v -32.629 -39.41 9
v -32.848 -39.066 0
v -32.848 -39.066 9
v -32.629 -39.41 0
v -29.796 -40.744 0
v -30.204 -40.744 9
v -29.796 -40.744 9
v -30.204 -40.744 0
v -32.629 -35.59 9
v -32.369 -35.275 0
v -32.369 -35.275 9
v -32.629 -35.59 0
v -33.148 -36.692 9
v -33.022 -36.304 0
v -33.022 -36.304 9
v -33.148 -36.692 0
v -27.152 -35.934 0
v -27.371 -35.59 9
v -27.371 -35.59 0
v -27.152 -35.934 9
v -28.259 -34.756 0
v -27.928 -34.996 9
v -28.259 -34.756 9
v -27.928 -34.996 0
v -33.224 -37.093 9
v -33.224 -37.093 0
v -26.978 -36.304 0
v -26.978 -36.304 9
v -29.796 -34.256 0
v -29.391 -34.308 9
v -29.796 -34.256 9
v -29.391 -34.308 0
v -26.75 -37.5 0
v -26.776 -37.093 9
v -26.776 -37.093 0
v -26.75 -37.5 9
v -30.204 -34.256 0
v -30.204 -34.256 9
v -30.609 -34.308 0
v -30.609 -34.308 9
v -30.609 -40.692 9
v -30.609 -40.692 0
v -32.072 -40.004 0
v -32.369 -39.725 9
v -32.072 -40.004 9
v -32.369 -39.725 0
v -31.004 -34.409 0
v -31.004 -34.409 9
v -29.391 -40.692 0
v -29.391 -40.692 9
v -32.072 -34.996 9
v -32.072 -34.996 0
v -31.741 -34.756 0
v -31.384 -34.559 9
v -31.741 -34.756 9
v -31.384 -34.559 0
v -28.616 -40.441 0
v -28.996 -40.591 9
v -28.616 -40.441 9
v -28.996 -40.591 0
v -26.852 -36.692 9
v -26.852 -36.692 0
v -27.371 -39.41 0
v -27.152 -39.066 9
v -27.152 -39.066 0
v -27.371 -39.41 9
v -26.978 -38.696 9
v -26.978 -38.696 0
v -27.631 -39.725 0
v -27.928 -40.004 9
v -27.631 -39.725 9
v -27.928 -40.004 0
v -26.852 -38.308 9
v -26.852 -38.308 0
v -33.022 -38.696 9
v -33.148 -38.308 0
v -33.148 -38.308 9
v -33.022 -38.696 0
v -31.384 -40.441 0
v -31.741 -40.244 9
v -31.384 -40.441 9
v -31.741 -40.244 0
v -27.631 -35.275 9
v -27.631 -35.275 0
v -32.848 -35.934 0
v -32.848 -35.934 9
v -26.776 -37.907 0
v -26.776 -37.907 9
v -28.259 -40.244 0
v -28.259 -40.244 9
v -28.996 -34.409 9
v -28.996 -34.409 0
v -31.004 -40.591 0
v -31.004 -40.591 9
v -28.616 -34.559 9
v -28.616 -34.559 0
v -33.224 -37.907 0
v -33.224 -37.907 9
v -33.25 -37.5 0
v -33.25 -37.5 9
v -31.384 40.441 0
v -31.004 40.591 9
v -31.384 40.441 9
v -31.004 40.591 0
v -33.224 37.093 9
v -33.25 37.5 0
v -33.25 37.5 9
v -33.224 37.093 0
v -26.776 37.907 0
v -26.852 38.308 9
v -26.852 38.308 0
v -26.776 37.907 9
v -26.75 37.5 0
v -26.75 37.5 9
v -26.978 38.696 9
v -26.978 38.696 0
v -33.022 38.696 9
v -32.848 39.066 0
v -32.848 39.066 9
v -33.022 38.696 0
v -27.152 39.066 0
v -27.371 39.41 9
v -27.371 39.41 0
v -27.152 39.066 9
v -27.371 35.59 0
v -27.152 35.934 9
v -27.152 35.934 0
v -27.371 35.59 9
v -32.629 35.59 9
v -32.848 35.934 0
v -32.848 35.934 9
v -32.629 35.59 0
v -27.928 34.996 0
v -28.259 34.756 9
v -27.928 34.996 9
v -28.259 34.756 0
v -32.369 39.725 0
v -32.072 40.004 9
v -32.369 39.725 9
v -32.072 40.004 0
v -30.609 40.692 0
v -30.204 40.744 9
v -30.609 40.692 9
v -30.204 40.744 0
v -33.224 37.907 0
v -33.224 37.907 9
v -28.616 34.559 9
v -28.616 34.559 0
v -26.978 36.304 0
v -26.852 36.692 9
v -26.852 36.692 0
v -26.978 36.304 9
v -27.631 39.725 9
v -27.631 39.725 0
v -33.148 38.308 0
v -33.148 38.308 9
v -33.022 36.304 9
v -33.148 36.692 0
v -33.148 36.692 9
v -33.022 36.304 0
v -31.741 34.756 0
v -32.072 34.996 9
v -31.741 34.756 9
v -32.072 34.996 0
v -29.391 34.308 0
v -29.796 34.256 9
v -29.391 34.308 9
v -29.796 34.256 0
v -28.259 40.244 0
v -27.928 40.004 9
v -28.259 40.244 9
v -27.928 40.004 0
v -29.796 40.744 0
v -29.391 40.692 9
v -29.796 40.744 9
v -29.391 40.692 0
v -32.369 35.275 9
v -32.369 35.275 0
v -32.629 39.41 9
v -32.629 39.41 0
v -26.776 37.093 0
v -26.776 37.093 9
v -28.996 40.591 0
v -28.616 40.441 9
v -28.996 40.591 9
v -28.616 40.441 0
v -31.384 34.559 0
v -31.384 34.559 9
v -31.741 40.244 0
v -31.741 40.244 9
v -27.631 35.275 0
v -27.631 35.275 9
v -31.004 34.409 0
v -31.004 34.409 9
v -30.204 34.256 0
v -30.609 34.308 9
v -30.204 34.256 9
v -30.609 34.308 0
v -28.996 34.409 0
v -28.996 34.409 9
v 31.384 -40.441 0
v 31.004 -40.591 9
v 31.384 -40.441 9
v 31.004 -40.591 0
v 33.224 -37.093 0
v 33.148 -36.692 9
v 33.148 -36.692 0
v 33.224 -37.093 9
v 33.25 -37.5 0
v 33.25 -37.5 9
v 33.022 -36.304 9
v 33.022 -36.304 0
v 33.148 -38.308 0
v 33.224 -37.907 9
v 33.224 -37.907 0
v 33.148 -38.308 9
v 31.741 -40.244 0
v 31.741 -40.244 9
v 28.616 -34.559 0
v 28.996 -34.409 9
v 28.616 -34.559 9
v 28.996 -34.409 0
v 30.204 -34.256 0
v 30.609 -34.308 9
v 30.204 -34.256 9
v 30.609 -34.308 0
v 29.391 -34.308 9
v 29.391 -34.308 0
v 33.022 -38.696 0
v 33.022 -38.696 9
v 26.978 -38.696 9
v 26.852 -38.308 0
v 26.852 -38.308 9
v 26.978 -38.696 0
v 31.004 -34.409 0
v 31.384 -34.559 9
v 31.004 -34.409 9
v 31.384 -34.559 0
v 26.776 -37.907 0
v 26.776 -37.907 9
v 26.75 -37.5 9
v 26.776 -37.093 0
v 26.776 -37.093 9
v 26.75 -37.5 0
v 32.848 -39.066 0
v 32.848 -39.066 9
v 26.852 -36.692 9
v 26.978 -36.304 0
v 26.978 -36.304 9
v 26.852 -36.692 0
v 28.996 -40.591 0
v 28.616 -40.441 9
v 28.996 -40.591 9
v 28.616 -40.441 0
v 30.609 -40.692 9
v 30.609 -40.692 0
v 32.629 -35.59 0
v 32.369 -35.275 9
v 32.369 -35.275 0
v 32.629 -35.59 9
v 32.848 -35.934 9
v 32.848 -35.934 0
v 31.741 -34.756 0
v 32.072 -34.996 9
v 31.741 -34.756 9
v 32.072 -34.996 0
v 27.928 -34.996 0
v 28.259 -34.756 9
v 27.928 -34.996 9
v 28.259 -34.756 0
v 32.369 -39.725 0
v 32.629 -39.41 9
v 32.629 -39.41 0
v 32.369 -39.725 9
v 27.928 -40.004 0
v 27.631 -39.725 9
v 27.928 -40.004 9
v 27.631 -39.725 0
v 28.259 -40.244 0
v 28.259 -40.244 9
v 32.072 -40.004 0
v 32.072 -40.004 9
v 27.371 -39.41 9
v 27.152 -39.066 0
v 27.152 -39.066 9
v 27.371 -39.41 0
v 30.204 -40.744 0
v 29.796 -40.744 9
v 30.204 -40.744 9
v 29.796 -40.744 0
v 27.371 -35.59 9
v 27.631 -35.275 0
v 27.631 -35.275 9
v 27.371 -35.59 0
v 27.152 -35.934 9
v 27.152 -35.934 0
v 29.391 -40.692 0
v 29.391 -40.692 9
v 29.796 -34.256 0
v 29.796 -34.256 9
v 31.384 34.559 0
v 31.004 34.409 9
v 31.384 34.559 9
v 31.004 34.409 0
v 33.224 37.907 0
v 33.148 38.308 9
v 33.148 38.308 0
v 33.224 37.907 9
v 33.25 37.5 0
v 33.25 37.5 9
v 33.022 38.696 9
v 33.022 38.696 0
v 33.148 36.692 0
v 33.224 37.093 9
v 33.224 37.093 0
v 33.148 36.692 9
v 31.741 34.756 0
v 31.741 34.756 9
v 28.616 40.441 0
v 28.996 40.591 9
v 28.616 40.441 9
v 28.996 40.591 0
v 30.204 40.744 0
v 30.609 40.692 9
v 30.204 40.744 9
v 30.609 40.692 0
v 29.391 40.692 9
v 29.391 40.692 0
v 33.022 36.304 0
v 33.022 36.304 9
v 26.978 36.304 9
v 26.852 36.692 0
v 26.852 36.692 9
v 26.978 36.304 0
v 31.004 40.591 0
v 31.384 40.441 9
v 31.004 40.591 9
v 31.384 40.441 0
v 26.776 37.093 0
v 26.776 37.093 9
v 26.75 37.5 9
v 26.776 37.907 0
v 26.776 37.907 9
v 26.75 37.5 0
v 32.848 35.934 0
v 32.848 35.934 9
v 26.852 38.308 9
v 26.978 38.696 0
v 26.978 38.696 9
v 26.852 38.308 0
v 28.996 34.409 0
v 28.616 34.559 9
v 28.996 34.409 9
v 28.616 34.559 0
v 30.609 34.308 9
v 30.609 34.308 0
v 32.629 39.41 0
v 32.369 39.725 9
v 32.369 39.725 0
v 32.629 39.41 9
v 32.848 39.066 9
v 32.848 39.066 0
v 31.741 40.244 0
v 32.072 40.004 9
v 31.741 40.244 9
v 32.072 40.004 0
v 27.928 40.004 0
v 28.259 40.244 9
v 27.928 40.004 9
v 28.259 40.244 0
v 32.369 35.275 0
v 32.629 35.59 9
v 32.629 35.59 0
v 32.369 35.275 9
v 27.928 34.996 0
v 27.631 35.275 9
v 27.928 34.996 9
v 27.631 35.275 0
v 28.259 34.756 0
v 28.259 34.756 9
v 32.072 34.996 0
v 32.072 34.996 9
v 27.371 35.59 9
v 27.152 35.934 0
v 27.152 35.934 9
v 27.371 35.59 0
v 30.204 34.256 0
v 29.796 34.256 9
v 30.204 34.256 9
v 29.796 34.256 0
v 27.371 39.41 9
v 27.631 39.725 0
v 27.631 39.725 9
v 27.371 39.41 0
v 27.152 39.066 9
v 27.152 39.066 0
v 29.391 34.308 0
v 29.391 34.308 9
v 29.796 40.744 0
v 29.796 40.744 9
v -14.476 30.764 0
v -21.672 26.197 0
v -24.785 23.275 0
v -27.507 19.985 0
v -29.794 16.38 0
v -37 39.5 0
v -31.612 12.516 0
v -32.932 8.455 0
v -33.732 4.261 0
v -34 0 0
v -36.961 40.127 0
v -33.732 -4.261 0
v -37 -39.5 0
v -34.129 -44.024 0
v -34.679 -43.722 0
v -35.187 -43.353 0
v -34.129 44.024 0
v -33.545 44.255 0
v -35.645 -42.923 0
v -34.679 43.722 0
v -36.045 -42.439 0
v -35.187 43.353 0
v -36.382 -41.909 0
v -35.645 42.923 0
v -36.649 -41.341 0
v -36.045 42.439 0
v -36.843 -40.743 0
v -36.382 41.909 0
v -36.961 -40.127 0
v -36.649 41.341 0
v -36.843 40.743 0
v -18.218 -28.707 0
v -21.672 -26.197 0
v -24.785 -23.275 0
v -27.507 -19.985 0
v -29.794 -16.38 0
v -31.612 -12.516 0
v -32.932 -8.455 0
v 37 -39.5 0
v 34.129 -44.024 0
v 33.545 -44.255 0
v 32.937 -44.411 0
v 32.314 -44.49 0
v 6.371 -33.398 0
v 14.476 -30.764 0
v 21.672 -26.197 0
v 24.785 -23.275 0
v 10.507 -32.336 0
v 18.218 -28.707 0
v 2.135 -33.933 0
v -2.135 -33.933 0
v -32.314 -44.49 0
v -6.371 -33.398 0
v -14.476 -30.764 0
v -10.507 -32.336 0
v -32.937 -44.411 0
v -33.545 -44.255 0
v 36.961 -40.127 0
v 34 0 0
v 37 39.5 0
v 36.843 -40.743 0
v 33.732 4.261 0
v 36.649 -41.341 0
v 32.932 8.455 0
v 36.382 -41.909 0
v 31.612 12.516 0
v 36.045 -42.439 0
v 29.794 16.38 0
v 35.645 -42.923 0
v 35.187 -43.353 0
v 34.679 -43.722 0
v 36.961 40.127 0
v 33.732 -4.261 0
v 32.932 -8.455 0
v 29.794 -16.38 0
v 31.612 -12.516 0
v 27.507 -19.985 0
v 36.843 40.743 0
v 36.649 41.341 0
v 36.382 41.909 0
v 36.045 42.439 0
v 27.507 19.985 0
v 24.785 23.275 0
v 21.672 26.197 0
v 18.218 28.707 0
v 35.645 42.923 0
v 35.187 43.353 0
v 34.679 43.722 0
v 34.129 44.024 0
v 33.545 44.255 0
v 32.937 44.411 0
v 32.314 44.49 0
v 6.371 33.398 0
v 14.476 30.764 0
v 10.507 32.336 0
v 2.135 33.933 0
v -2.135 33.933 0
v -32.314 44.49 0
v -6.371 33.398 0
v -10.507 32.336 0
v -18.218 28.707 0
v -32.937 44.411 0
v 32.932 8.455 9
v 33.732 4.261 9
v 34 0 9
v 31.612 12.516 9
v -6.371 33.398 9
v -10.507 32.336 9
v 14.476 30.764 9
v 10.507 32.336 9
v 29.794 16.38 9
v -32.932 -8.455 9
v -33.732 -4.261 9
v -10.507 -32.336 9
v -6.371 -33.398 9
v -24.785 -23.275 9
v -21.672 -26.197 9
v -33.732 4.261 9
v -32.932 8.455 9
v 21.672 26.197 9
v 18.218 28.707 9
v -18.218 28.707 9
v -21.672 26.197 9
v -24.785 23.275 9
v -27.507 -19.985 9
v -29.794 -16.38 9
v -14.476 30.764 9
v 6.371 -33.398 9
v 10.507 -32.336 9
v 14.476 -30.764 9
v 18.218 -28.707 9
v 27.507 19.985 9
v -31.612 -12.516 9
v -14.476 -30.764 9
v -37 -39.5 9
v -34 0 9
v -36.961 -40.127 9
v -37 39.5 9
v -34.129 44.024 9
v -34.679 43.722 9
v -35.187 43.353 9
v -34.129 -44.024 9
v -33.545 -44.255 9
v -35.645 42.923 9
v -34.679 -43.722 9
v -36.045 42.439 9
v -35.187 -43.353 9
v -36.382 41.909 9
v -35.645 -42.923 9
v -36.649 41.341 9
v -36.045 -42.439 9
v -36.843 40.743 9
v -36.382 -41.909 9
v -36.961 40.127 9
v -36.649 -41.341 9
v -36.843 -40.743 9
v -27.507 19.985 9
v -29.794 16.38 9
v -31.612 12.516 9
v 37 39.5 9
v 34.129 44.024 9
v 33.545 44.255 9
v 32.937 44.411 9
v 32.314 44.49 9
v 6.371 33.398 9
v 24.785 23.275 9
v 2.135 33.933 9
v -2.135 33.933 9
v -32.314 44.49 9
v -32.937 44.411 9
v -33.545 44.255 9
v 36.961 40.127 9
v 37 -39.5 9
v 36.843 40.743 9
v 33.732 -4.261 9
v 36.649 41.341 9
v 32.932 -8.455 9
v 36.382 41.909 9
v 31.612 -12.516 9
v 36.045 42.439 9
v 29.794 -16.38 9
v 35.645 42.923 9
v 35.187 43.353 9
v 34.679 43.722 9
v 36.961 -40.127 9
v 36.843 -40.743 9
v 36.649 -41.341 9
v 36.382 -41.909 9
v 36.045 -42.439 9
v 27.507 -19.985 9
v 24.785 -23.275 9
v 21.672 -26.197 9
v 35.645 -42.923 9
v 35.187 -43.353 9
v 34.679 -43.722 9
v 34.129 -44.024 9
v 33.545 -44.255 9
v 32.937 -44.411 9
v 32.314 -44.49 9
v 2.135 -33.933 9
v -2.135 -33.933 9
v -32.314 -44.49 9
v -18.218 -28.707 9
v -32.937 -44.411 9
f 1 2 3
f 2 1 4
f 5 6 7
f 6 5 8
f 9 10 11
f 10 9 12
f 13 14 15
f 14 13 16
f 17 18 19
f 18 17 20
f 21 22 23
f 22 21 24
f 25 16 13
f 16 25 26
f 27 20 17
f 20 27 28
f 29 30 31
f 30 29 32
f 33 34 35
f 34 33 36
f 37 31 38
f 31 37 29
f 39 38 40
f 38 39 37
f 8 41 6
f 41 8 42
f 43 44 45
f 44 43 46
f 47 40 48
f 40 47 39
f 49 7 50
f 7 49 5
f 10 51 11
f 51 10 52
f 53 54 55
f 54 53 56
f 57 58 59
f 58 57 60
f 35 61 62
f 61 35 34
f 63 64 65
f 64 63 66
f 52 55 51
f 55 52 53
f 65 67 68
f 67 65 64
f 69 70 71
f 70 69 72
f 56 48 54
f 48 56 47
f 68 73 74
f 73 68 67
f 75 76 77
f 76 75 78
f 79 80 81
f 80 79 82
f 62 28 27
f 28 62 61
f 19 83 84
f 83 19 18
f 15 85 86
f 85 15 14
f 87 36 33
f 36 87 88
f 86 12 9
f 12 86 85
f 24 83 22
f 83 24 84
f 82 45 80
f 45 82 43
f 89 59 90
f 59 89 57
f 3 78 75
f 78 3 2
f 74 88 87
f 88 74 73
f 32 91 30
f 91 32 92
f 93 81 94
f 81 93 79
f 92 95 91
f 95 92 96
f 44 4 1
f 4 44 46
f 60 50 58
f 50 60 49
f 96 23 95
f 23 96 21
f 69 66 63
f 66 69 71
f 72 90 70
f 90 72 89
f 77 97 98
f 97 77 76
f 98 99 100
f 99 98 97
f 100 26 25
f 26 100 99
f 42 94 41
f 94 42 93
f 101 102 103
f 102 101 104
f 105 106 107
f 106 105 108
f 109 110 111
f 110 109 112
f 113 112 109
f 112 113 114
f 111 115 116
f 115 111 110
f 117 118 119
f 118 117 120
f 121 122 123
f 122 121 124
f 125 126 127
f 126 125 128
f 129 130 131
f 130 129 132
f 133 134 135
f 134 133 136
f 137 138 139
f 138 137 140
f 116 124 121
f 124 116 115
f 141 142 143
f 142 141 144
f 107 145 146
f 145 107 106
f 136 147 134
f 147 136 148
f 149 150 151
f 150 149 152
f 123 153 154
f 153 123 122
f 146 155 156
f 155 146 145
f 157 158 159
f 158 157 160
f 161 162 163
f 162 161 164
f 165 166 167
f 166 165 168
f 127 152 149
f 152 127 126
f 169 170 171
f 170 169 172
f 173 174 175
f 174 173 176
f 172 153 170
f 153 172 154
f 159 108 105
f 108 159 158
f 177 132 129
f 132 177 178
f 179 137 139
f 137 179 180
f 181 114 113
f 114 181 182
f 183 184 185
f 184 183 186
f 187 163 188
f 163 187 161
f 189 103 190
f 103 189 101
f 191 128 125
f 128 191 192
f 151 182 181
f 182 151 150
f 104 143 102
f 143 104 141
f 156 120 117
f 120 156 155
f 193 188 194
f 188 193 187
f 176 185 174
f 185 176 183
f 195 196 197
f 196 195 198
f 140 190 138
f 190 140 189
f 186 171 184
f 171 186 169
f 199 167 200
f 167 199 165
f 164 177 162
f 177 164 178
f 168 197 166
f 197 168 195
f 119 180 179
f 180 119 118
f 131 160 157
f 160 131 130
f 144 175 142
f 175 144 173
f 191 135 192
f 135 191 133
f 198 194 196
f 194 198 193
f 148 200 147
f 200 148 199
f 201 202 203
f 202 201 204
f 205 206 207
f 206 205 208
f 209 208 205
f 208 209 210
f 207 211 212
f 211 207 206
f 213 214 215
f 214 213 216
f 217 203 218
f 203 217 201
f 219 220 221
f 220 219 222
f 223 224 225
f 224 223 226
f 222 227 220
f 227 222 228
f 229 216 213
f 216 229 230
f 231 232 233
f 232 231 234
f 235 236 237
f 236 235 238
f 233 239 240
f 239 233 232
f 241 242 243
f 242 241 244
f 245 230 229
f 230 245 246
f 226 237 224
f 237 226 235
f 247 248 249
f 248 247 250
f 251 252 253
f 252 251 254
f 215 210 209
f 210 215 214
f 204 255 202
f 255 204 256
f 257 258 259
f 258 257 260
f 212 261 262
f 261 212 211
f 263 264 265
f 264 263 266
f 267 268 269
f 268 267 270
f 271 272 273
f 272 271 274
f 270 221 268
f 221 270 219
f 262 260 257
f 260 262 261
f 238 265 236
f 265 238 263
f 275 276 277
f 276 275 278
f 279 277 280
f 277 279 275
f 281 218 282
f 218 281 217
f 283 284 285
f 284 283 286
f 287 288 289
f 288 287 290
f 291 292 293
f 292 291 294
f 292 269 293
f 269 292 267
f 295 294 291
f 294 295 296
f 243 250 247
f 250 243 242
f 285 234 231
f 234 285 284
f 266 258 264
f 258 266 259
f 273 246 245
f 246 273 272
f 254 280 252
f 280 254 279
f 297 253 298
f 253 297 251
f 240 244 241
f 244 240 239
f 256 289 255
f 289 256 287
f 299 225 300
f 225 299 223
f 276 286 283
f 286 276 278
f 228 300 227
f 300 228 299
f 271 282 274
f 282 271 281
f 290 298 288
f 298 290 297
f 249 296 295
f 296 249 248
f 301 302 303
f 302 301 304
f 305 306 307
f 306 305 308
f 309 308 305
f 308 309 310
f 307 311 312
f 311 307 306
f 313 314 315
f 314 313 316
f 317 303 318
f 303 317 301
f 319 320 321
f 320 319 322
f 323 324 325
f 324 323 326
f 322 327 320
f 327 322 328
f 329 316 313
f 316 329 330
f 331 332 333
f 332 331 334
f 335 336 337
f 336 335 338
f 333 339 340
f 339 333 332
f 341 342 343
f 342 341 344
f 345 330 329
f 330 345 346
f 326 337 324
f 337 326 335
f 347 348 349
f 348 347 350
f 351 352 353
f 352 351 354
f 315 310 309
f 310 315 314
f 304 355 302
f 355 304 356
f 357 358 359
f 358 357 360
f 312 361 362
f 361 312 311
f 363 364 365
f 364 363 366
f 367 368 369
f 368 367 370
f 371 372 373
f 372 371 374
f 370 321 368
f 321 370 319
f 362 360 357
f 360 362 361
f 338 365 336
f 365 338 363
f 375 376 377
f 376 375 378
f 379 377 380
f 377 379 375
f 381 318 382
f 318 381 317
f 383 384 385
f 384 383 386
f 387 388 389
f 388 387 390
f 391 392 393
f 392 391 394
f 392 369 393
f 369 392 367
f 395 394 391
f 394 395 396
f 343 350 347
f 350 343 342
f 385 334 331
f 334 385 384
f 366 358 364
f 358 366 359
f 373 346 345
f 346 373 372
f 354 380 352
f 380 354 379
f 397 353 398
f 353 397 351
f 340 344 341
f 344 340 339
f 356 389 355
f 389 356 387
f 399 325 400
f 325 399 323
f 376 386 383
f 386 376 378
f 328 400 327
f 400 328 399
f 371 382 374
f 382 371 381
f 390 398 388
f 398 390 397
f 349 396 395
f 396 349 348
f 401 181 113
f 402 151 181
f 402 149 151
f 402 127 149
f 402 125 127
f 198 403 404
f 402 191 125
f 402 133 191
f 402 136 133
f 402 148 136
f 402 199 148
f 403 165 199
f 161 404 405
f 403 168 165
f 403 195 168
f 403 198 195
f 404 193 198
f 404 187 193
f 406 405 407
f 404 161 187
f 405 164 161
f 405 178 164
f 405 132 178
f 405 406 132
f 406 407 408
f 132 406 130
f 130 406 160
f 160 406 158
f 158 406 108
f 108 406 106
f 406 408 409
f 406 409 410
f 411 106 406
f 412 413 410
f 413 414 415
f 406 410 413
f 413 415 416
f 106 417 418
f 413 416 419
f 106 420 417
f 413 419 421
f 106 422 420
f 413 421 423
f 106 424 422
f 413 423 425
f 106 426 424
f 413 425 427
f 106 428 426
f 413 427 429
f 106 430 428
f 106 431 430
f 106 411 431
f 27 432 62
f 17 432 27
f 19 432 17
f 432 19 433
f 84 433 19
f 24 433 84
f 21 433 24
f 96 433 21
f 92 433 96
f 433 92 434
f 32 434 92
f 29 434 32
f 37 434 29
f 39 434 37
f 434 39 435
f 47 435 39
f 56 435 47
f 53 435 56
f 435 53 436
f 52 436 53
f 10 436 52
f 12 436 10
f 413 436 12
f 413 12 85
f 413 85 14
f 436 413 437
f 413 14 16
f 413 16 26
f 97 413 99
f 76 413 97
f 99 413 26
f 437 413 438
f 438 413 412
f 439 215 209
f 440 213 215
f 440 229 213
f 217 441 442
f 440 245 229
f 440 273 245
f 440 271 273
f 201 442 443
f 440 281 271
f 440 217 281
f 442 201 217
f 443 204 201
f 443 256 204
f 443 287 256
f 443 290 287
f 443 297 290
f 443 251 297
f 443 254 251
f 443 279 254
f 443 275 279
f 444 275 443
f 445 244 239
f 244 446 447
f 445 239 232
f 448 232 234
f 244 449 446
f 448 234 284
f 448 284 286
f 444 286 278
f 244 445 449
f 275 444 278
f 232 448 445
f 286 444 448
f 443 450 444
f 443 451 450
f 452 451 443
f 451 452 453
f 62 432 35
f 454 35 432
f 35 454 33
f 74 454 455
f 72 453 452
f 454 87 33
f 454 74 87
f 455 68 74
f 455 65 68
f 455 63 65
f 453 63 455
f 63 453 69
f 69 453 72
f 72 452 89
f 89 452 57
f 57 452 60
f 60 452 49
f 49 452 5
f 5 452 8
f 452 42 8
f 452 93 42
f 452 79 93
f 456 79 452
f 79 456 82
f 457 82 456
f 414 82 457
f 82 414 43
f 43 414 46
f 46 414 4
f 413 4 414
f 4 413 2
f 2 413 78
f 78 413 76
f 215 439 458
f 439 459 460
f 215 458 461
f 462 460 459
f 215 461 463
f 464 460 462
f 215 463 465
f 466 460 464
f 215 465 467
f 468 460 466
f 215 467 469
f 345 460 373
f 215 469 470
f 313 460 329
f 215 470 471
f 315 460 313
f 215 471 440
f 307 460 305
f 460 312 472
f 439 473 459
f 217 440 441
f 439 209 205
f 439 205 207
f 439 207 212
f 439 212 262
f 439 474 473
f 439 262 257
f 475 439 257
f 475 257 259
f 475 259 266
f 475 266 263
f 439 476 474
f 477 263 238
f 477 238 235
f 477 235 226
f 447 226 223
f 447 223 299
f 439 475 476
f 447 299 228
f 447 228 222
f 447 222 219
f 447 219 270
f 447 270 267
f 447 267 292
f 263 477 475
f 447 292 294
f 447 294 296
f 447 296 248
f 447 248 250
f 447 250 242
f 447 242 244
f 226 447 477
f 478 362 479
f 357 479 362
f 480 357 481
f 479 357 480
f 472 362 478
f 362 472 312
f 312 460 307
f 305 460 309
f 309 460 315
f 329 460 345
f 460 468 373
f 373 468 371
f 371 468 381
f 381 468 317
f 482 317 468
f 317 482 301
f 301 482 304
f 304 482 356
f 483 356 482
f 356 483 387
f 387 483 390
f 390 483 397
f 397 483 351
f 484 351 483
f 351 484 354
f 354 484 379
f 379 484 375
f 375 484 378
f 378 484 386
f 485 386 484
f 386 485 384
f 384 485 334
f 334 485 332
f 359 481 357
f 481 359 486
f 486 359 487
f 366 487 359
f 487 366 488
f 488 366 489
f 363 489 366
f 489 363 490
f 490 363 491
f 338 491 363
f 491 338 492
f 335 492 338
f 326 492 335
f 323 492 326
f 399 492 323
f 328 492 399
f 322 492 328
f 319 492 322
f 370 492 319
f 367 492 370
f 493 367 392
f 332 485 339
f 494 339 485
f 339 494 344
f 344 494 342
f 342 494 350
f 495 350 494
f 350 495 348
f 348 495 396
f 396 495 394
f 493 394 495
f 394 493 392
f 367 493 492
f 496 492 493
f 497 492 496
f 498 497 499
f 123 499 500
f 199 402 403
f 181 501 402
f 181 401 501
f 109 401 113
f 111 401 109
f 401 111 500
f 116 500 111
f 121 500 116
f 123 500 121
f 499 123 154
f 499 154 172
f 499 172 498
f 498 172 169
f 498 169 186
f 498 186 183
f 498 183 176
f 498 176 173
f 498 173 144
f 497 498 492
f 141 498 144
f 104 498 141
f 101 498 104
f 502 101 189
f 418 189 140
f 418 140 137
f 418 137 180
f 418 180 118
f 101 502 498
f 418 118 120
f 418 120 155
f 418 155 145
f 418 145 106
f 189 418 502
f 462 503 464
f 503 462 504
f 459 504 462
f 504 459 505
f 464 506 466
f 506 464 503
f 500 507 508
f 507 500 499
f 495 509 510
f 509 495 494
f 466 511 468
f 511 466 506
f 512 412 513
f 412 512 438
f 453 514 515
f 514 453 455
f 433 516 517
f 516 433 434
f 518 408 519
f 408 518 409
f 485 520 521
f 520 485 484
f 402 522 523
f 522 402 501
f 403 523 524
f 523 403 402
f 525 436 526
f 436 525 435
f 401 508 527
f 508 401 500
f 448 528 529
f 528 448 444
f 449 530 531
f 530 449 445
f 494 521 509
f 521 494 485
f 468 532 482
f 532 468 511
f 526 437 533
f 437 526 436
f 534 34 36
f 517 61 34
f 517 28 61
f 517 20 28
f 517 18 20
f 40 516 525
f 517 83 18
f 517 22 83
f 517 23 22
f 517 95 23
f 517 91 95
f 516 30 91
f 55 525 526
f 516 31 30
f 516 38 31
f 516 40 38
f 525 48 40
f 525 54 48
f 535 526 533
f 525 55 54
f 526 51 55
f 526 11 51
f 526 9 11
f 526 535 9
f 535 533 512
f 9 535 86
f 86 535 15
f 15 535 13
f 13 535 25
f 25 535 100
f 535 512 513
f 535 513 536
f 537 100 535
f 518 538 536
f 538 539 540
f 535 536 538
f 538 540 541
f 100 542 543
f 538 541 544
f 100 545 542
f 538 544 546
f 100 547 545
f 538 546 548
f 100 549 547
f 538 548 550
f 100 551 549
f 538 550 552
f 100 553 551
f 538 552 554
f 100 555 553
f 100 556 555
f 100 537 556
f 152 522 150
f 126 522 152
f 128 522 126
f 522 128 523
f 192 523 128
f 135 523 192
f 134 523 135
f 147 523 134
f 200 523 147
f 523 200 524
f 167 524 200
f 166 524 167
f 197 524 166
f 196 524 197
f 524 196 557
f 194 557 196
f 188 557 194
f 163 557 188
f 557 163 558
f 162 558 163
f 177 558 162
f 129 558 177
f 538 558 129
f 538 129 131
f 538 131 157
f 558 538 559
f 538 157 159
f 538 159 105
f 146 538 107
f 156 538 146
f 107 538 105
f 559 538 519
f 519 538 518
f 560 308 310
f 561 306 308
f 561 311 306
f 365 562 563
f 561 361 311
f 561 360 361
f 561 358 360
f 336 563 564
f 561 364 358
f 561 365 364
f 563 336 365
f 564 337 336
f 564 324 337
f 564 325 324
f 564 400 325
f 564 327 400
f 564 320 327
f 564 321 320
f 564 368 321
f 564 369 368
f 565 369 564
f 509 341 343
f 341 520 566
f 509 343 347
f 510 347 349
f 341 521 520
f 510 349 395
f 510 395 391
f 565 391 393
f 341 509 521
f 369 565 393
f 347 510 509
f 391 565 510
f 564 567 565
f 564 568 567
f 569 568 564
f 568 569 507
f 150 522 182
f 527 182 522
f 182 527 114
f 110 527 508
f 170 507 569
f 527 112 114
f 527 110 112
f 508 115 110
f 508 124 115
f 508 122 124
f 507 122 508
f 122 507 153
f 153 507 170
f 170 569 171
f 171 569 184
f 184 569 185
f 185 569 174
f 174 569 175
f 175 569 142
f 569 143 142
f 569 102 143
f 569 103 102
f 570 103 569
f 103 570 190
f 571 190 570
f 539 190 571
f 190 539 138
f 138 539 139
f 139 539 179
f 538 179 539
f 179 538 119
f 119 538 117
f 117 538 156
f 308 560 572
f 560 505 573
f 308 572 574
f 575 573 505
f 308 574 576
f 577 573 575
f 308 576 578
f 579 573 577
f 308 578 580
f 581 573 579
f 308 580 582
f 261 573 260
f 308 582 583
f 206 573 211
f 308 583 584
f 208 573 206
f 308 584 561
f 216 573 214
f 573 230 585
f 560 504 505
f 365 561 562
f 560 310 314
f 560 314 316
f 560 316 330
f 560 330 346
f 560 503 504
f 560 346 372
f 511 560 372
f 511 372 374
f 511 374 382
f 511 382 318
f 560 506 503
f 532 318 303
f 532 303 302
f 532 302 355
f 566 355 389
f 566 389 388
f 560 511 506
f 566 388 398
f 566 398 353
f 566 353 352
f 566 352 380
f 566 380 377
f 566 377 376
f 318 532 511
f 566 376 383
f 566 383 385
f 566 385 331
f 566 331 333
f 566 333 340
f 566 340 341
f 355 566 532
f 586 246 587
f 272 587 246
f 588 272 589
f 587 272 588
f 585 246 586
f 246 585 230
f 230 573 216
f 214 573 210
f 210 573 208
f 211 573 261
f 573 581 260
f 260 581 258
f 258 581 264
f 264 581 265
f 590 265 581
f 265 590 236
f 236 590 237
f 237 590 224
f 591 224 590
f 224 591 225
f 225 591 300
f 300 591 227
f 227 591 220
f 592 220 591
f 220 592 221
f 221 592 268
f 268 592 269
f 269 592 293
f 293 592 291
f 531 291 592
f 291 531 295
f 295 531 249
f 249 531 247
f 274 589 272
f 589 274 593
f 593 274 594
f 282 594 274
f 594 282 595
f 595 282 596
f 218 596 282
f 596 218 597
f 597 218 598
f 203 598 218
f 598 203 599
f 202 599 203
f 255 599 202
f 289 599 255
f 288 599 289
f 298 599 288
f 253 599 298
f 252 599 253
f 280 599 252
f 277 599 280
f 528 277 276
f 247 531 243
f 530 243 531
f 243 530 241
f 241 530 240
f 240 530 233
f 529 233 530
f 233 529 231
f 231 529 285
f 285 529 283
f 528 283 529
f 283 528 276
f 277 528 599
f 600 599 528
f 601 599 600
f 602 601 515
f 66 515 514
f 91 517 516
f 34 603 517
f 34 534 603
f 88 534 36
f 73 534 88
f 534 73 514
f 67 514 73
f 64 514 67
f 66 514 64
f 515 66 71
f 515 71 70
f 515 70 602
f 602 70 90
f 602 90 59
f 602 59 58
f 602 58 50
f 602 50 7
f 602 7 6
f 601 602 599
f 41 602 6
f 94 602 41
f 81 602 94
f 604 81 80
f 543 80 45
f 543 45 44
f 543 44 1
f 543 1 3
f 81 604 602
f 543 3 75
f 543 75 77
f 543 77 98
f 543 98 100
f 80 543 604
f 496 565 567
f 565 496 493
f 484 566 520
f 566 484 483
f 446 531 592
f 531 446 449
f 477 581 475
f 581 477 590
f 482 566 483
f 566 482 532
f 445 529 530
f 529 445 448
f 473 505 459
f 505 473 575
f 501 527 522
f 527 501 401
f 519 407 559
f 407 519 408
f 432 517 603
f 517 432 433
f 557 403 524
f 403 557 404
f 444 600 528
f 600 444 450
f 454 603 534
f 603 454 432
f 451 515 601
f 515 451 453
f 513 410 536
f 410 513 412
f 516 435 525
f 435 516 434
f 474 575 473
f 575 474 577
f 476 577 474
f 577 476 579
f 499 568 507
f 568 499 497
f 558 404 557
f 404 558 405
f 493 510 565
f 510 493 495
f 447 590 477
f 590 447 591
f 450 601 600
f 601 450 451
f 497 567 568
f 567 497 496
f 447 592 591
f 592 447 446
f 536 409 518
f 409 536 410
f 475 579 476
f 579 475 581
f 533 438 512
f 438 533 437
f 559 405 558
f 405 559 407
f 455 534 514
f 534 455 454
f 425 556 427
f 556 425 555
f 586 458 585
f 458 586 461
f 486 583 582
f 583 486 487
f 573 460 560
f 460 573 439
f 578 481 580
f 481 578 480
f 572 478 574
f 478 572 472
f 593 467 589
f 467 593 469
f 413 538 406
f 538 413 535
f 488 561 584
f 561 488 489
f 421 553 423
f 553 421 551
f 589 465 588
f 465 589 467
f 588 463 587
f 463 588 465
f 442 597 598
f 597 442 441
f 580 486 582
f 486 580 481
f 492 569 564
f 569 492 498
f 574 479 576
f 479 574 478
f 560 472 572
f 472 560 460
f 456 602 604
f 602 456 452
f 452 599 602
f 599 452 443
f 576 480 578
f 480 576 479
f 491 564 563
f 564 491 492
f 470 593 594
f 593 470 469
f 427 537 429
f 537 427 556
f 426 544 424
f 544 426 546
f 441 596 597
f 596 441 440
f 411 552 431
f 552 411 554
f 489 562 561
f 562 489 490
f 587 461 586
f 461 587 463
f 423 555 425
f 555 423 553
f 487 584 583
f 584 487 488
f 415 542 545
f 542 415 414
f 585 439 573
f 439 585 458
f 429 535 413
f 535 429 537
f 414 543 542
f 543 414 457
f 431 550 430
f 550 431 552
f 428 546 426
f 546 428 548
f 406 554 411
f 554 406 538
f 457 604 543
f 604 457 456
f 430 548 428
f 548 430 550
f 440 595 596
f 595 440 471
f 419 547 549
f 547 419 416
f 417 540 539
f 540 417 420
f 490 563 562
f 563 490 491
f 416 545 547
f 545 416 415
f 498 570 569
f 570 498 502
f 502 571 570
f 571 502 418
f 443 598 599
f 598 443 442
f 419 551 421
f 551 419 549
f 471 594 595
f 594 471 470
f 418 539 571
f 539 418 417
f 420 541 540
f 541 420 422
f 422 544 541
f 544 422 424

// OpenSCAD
$fn = 50;


difference() {
	union() {
		hull() {
			translate(v = [-32.0000000000, 39.5000000000, 0]) {
				cylinder(h = 9, r = 5);
			}
			translate(v = [32.0000000000, 39.5000000000, 0]) {
				cylinder(h = 9, r = 5);
			}
			translate(v = [-32.0000000000, -39.5000000000, 0]) {
				cylinder(h = 9, r = 5);
			}
			translate(v = [32.0000000000, -39.5000000000, 0]) {
				cylinder(h = 9, r = 5);
			}
		}
	}
	union() {
		#translate(v = [-30.0000000000, -37.5000000000, -100.0000000000]) {
			cylinder(h = 200, r = 3.2500000000);
		}
		#translate(v = [-30.0000000000, 37.5000000000, -100.0000000000]) {
			cylinder(h = 200, r = 3.2500000000);
		}
		#translate(v = [30.0000000000, -37.5000000000, -100.0000000000]) {
			cylinder(h = 200, r = 3.2500000000);
		}
		#translate(v = [30.0000000000, 37.5000000000, -100.0000000000]) {
			cylinder(h = 200, r = 3.2500000000);
		}
		#cylinder(h = 9, r = 34.0000000000);
	}
}
